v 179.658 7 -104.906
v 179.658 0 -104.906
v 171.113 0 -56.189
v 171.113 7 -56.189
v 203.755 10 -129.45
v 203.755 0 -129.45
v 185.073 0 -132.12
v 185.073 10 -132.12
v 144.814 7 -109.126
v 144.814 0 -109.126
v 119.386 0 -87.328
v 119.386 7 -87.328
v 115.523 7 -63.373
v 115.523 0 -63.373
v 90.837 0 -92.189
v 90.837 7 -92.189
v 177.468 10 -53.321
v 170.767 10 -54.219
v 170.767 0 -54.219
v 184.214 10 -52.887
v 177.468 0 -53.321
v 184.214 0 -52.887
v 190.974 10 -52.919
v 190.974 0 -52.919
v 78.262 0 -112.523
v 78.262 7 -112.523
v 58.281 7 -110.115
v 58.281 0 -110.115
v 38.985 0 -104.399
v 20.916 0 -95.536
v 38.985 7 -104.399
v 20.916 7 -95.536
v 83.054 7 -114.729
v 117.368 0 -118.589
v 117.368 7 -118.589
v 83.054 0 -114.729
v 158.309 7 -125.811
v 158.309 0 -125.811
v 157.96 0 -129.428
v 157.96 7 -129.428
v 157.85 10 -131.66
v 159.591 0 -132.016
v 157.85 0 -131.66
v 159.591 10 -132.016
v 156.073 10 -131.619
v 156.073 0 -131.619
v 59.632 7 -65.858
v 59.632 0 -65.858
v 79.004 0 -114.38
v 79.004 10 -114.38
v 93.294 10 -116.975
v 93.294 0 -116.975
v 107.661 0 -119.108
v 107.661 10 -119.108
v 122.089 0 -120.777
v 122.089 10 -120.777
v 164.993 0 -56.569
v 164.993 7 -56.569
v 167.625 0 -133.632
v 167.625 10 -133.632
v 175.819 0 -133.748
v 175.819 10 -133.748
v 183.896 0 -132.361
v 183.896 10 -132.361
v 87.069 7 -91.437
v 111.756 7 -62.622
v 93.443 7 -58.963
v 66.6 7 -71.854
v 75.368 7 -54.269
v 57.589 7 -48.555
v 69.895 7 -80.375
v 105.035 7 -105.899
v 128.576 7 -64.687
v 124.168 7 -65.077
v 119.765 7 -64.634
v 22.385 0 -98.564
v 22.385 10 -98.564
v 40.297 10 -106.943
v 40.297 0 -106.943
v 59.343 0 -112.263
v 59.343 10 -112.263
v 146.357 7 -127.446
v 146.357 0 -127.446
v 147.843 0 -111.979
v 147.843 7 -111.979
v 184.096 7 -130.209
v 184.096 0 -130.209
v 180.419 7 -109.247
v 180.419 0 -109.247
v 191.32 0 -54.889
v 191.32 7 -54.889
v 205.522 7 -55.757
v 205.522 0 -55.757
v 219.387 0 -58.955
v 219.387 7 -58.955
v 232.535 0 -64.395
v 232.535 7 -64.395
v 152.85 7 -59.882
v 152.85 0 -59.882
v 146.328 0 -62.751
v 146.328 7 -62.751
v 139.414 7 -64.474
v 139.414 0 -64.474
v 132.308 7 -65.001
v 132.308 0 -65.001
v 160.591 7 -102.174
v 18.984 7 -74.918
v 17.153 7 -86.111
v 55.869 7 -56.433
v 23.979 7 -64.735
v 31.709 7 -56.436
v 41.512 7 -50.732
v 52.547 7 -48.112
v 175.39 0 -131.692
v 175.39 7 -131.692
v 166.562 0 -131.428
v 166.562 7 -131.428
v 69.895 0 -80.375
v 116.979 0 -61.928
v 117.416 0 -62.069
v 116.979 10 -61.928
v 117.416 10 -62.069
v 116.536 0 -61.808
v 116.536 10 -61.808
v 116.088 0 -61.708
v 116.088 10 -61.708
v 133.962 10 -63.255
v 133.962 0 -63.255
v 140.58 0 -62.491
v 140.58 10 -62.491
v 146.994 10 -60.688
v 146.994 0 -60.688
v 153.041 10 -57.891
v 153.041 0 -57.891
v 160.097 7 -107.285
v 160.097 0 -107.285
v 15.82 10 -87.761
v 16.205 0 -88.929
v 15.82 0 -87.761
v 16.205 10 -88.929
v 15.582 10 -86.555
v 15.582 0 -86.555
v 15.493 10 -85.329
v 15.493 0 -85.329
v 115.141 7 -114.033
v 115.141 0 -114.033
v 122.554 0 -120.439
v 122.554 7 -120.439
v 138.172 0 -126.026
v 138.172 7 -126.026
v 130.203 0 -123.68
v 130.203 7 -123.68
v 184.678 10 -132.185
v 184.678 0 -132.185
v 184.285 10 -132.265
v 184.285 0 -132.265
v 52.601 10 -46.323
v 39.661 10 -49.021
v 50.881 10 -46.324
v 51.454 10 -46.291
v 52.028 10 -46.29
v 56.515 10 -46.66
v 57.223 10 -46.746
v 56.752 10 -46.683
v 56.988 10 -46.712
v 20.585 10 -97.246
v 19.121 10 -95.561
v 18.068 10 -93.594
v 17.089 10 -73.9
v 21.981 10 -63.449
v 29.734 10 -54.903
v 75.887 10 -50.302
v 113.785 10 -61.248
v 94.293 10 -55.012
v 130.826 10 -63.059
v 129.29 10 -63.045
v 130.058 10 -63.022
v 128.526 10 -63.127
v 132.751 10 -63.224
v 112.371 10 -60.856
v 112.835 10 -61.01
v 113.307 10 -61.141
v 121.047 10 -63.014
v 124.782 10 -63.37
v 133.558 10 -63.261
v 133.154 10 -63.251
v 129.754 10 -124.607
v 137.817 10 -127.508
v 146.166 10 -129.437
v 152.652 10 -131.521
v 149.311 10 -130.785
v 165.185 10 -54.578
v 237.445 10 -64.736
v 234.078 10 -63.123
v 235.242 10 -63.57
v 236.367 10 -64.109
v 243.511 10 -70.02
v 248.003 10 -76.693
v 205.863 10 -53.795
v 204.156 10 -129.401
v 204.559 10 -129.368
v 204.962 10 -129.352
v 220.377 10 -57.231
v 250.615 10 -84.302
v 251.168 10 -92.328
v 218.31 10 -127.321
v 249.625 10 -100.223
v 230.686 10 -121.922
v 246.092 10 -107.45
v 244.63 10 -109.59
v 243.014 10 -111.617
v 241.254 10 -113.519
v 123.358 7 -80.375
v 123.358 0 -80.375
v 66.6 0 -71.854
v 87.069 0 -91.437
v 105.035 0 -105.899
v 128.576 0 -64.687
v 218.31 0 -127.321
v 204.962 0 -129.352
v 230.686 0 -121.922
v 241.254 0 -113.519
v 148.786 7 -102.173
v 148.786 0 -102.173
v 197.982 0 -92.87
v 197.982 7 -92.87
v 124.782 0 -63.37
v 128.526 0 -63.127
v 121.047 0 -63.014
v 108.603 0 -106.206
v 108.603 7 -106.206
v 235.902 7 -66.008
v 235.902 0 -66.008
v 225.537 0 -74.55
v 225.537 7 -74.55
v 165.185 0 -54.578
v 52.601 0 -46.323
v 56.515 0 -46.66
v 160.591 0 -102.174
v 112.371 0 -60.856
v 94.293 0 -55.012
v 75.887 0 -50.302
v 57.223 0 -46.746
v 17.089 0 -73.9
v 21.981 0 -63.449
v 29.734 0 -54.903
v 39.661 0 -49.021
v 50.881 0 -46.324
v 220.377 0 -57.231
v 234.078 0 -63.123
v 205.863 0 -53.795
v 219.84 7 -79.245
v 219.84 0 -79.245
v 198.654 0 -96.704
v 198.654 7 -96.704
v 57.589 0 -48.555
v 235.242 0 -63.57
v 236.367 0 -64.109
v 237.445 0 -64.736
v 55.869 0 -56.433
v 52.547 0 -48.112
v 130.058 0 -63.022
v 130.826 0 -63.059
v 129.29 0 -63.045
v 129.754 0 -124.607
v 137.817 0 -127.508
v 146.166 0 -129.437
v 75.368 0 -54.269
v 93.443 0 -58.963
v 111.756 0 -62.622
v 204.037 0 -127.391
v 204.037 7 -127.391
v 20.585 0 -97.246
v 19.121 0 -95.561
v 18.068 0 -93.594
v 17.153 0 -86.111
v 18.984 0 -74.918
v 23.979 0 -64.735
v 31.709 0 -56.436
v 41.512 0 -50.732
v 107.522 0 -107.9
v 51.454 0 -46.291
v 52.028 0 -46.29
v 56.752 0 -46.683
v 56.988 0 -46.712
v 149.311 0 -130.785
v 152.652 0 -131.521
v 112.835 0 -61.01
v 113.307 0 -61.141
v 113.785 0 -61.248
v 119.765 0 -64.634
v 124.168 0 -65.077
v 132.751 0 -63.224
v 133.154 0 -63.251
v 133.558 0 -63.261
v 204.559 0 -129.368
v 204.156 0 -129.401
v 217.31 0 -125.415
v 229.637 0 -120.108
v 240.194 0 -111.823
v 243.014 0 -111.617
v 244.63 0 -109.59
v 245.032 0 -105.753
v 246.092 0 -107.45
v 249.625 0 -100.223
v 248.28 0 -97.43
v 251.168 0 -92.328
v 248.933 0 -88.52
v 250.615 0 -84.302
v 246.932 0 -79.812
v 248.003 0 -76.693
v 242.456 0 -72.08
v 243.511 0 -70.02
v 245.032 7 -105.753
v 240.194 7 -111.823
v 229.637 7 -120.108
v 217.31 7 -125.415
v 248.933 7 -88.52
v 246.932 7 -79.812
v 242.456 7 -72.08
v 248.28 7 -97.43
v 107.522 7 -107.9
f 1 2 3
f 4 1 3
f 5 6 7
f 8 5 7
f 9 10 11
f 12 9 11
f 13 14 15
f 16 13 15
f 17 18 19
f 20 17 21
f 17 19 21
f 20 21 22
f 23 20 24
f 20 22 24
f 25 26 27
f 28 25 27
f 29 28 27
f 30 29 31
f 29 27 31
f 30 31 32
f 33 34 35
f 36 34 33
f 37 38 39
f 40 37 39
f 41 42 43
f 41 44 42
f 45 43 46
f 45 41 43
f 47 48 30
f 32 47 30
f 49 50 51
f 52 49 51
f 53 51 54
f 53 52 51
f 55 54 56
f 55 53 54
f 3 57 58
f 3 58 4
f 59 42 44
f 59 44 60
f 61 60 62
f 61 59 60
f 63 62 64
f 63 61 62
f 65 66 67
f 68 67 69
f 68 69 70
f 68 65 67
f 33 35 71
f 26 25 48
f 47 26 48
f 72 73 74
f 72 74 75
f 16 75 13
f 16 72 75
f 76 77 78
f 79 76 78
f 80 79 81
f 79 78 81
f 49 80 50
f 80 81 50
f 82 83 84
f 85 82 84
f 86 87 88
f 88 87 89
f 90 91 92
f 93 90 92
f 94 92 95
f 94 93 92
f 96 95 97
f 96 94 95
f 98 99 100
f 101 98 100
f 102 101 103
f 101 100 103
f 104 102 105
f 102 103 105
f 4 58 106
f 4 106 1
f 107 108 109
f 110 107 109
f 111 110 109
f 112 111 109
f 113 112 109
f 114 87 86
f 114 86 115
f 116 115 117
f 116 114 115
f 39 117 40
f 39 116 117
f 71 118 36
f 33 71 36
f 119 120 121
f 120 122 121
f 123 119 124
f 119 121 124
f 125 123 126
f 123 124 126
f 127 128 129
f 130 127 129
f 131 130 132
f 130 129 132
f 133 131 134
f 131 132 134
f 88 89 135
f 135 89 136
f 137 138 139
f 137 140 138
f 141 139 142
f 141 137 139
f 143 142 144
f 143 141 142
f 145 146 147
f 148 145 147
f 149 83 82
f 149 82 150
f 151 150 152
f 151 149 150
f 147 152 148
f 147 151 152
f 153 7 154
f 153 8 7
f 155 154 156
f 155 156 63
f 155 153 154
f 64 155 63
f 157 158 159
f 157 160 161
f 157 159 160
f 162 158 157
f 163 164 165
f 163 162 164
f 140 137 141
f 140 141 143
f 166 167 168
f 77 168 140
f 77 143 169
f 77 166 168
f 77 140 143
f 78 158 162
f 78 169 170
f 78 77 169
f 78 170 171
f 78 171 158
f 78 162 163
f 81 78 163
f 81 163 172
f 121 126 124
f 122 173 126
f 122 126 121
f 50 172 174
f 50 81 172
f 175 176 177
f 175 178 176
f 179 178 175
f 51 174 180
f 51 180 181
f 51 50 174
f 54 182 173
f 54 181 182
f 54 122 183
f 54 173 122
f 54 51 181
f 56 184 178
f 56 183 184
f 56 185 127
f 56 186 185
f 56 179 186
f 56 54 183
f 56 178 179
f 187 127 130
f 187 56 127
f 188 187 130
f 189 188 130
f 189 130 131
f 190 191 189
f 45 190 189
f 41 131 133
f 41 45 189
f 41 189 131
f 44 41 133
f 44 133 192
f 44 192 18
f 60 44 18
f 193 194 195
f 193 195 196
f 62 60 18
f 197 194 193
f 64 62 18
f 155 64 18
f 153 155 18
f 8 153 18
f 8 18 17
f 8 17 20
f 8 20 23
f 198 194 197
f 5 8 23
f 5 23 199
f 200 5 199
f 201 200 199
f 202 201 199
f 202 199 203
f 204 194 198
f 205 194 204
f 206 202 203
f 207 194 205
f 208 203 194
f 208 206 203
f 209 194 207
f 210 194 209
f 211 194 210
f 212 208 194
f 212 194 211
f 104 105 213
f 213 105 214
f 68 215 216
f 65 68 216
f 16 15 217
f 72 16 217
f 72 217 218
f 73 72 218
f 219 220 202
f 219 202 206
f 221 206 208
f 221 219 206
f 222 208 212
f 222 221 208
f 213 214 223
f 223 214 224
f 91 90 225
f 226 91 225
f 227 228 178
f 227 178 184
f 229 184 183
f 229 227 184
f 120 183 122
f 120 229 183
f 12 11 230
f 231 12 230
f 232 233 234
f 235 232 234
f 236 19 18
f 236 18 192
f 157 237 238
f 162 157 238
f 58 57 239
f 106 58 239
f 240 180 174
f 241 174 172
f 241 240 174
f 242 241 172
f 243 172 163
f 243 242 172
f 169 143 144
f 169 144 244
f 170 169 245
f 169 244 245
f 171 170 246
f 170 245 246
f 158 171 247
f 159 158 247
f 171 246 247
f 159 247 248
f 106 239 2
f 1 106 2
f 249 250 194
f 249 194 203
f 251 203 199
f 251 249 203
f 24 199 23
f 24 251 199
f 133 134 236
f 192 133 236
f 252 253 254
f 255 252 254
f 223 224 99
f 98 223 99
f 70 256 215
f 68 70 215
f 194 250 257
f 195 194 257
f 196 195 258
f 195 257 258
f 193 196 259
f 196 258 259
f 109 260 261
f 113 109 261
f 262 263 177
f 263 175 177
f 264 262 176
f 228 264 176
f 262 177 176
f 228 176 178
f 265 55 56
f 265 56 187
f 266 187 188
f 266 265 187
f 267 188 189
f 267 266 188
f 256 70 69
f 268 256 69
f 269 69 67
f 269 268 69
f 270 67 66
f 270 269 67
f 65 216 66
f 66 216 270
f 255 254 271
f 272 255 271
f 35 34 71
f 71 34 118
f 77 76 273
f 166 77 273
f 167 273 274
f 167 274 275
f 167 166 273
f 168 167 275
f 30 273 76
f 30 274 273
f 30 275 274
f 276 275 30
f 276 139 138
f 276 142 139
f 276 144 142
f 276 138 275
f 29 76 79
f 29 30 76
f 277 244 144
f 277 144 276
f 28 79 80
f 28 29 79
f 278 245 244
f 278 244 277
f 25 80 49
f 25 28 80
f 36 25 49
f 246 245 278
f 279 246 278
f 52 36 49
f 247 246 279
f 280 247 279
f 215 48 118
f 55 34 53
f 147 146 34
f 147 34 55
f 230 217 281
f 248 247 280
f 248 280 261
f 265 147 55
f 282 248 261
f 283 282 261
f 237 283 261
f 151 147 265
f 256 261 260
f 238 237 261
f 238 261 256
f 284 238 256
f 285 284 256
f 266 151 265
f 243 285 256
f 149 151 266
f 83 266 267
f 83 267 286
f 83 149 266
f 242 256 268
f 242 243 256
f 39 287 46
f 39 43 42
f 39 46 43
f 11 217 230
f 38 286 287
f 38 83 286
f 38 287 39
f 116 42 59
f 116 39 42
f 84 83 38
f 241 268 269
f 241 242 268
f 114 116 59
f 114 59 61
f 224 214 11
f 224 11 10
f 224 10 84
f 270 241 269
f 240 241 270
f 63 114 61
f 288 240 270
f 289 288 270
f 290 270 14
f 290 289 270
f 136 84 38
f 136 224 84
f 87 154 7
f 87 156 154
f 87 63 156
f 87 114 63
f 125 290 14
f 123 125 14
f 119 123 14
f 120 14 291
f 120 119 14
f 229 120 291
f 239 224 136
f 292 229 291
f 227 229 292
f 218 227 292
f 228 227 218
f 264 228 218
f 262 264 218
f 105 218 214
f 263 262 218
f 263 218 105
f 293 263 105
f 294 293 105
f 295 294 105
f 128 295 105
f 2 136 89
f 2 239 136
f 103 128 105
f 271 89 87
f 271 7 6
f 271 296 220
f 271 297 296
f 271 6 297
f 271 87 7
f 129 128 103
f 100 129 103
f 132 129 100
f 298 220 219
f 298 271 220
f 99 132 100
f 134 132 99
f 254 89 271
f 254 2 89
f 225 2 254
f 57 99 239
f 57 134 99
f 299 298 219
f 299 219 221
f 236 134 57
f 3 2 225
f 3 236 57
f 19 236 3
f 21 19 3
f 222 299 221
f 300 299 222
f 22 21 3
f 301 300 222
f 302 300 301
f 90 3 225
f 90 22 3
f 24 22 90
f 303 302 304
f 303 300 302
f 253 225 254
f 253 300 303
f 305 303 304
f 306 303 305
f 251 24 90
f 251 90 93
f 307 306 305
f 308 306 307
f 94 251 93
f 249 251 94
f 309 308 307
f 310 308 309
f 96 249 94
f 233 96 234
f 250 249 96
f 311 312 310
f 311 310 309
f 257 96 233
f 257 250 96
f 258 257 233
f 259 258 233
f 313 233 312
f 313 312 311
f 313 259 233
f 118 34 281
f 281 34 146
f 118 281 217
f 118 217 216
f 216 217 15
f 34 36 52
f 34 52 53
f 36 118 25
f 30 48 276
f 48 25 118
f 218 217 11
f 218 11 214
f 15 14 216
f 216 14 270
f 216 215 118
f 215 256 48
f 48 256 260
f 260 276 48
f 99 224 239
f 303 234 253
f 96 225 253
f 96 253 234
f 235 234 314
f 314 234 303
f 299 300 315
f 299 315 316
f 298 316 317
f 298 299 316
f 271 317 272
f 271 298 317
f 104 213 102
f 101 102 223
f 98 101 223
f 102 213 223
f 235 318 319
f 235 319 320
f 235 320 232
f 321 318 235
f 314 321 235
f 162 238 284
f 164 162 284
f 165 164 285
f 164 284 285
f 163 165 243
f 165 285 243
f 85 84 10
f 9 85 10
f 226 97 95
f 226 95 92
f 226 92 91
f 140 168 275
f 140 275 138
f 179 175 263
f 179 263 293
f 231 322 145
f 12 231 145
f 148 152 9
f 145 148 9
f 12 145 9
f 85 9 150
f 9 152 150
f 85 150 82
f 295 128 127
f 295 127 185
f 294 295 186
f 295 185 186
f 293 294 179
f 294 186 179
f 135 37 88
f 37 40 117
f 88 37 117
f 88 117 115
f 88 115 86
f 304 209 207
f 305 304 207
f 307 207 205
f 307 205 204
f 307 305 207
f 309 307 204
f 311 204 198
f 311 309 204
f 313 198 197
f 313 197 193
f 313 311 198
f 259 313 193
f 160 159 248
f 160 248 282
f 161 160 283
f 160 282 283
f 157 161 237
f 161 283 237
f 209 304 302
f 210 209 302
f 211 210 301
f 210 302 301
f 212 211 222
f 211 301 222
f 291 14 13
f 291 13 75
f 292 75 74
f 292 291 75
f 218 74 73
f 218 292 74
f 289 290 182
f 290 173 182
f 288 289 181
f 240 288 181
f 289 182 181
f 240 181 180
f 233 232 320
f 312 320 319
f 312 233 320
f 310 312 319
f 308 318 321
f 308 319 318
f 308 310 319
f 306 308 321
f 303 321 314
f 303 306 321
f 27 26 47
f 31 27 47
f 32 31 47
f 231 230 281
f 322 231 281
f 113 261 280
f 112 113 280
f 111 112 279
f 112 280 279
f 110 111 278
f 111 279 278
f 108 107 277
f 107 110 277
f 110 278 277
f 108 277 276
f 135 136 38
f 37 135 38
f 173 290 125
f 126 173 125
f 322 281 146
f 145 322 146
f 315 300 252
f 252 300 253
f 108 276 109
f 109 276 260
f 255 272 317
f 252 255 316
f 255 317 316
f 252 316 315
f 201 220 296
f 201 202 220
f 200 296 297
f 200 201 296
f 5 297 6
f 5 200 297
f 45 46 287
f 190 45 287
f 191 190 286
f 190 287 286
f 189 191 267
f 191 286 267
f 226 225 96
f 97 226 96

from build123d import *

# Parameters (mm, degrees)
BOSS_EXTRUDE1_DEPTH  = 10
BOSS_EXTRUDE2_DEPTH  = 10
FILLET1_R            = 10
BOSS_EXTRUDE3_DEPTH  = 10
FILLET2_R            = 10
FILLET3_R            = 10
BOSS_EXTRUDE4_DEPTH  = 10
BOSS_EXTRUDE5_DEPTH  = 10
BOSS_EXTRUDE6_DEPTH  = 10
BOSS_EXTRUDE7_DEPTH  = 10
BOSS_EXTRUDE8_DEPTH  = 10
BOSS_EXTRUDE9_DEPTH  = 10
BOSS_EXTRUDE10_DEPTH = 10
BOSS_EXTRUDE11_DEPTH = 10
BOSS_EXTRUDE12_DEPTH = 10
BOSS_EXTRUDE13_DEPTH = 10
FILLET4_R            = 10
FILLET5_R            = 10
FILLET6_R            = 10
BOSS_EXTRUDE14_DEPTH = 3
BOSS_EXTRUDE16_START = -3
BOSS_EXTRUDE16_DEPTH = 3
BOSS_EXTRUDE17_START = -3
BOSS_EXTRUDE17_DEPTH = 3
BOSS_EXTRUDE18_DEPTH = 3
BOSS_EXTRUDE19_START = -3
BOSS_EXTRUDE19_DEPTH = 3
BOSS_EXTRUDE20_START = -3
BOSS_EXTRUDE20_DEPTH = 3
BOSS_EXTRUDE21_START = -3
BOSS_EXTRUDE21_DEPTH = 3
BOSS_EXTRUDE22_START = -3
BOSS_EXTRUDE22_DEPTH = 3
BOSS_EXTRUDE23_DEPTH = 3
BOSS_EXTRUDE24_DEPTH = 3
BOSS_EXTRUDE25_START = -3
BOSS_EXTRUDE25_DEPTH = 3
BOSS_EXTRUDE26_START = -3
BOSS_EXTRUDE26_DEPTH = 3
BOSS_EXTRUDE27_START = -3
BOSS_EXTRUDE27_DEPTH = 3


with BuildPart() as part:
    # Sketch1 → Boss-Extrude1 (new body)
    with BuildSketch(Plane(origin=(0, 0, 0), x_dir=(1, 0, 0), z_dir=(0, 1, 0))):
        with BuildLine():
            Line((51.805250568, 46.254728184), (56.867580546, 46.690093705))
            Line((56.867580546, 46.690093705), (66.599539174, 71.853555984))
            Line((66.599539174, 71.853555984), (87.069484898, 91.437016001))
            Line((87.069484898, 91.437016001), (113.057432433, 61.102946487))
            Line((113.057432433, 61.102946487), (116.82467317, 61.854548169))
            Line((116.82467317, 61.854548169), (90.836725634, 92.188617682))
            Line((90.836725634, 92.188617682), (105.035116548, 105.898750841))
            Line((105.035116548, 105.898750841), (129.568132848, 62.950498647))
            Line((129.568132848, 62.950498647), (133.31455682, 63.272694914))
            Line((133.31455682, 63.272694914), (123.357580852, 80.374925591))
            Line((123.357580852, 80.374925591), (148.785651419, 102.172519068))
            Line((148.785651419, 102.172519068), (153.040868267, 57.891104139))
            Line((153.040868267, 57.891104139), (165.185425052, 54.57791328))
            Line((165.185425052, 54.57791328), (160.590576177, 102.174000873))
            Line((160.590576177, 102.174000873), (179.658076638, 104.906387862))
            Line((179.658076638, 104.906387862), (170.767457679, 54.218871994))
            ThreePointArc((170.767457679, 54.218871994), (180.837217506, 53.04614218), (190.97424035, 52.919153825))
            Line((190.97424035, 52.919153825), (197.981646973, 92.870031941))
            Line((197.981646973, 92.870031941), (234.078179475, 63.123049205))
            ThreePointArc((234.078179475, 63.123049205), (235.810126624, 63.828566908), (237.445115175, 64.736426258))
            Line((237.445115175, 64.736426258), (225.536614511, 74.55016567))
            Line((225.536614511, 74.55016567), (246.091874592, 107.449582187))
            ThreePointArc((246.091874592, 107.449582187), (243.840681793, 110.618047464), (241.25389096, 113.519004964))
            Line((241.25389096, 113.519004964), (240.395012362, 112.144339568))
            Line((240.395012362, 112.144339568), (219.839752281, 79.244923051))
            Line((219.839752281, 79.244923051), (198.654111375, 96.703910123))
            Line((198.654111375, 96.703910123), (204.382089549, 129.360464852))
            Line((204.382089549, 129.360464852), (184.447051736, 132.209464557))
            Line((184.447051736, 132.209464557), (180.419423262, 109.247004562))
            Line((180.419423262, 109.247004562), (160.097156473, 107.285125983))
            Line((160.097156473, 107.285125983), (158.308732306, 125.810652197))
            Line((158.308732306, 125.810652197), (157.766479573, 131.427617904))
            ThreePointArc((157.766479573, 131.427617904), (151.800844978, 131.395283067), (146.165668691, 129.437061966))
            Line((146.165668691, 129.437061966), (147.843325617, 111.978721981))
            Line((147.843325617, 111.978721981), (144.813827038, 109.125716877))
            Line((144.813827038, 109.125716877), (119.385756471, 87.3281234))
            Line((119.385756471, 87.3281234), (108.602540339, 106.205552911))
            Line((108.602540339, 106.205552911), (107.52160572, 107.900291772))
            Line((107.52160572, 107.900291772), (115.140722033, 114.033426524))
            Line((115.140722033, 114.033426524), (122.553726759, 120.438529801))
            ThreePointArc((122.553726759, 120.438529801), (122.391169983, 120.703903688), (122.08857731, 120.776606365))
            Line((122.08857731, 120.776606365), (117.367703847, 118.588729188))
            Line((117.367703847, 118.588729188), (69.895175345, 80.374925591))
            Line((69.895175345, 80.374925591), (83.054291448, 114.72858327))
            Line((83.054291448, 114.72858327), (79.00377159, 114.380234447))
            Line((79.00377159, 114.380234447), (59.63165965, 65.85792942))
            Line((59.63165965, 65.85792942), (19.328949542, 96.752897561))
            Line((19.328949542, 96.752897561), (15.566189716, 87.3281234))
            Line((15.566189716, 87.3281234), (55.868899823, 56.433155258))
            Line((55.868899823, 56.433155258), (51.805250568, 46.254728184))
        make_face()
    extrude(amount=BOSS_EXTRUDE1_DEPTH)

    # Sketch3 → Boss-Extrude2 (add)
    with BuildSketch(Plane(origin=(0, 0, 0), x_dir=(-1, 0, 0), z_dir=(0, -1, 0))):
        with BuildLine():
            Line((-184.447051736, 132.209464557), (-184.096250604, 130.209464557))
            ThreePointArc((-184.096250604, 130.209464557), (-170.969249532, 131.779309143), (-157.95955632, 129.427617904))
            Line((-157.95955632, 129.427617904), (-157.766479573, 131.427617904))
            ThreePointArc((-157.766479573, 131.427617904), (-171.046827654, 133.863929723), (-184.447051736, 132.209464557))
        make_face()
    extrude(amount=-BOSS_EXTRUDE2_DEPTH)

    # Fillet1
    fillet1_edges = [part.edges().sort_by_distance(p)[0] for p in [
        (157.766479573, 5, -131.427617904),
    ]]
    fillet(fillet1_edges, radius=FILLET1_R)

    # Sketch4 → Boss-Extrude3 (add)
    with BuildSketch(Plane.XZ):
        with BuildLine():
            Line((241.25389096, -113.519004964), (240.194147983, -111.822849068))
            ThreePointArc((240.194147983, -111.822849068), (223.645469846, -123.160543749), (204.036563274, -127.390538053))
            Line((204.036563274, -127.390538053), (204.382089549, -129.360464852))
            ThreePointArc((204.382089549, -129.360464852), (224.4077507, -125.139982982), (241.25389096, -113.519004964))
        make_face()
    extrude(amount=-BOSS_EXTRUDE3_DEPTH)

    # Fillet2
    fillet2_edges = [part.edges().sort_by_distance(p)[0] for p in [
        (204.382089549, 5, -129.360464852),
    ]]
    fillet(fillet2_edges, radius=FILLET2_R)

    # Fillet3
    fillet3_edges = [part.edges().sort_by_distance(p)[0] for p in [
        (184.447051736, 5, -132.209464557),
    ]]
    fillet(fillet3_edges, radius=FILLET3_R)

    # Sketch5 → Boss-Extrude4 (add)
    with BuildSketch(Plane(origin=(0, 0, 0), x_dir=(-1, 0, 0), z_dir=(0, -1, 0))):
        with BuildLine():
            Line((-146.165668691, 129.437061966), (-146.35697717, 127.446232725))
            ThreePointArc((-146.35697717, 127.446232725), (-134.153534544, 124.9675725), (-122.553726759, 120.438529801))
            ThreePointArc((-122.553726759, 120.438529801), (-122.391169983, 120.703903688), (-122.08857731, 120.776606365))
            ThreePointArc((-122.08857731, 120.776606365), (-133.74228961, 126.176716529), (-146.165668691, 129.437061966))
        make_face()
    extrude(amount=-BOSS_EXTRUDE4_DEPTH)

    # Sketch6 → Boss-Extrude5 (add)
    with BuildSketch(Plane.XZ):
        with BuildLine():
            Line((117.367703847, -118.588729188), (83.054291448, -114.72858327))
            Line((83.054291448, -114.72858327), (79.00377159, -114.380234447))
            ThreePointArc((79.00377159, -114.380234447), (100.4688886, -118.099003928), (122.08857731, -120.776606365))
            Line((122.08857731, -120.776606365), (117.367703847, -118.588729188))
        make_face()
    extrude(amount=-BOSS_EXTRUDE5_DEPTH)

    # Sketch7 → Boss-Extrude6 (add)
    with BuildSketch(Plane(origin=(0, 10, 0), x_dir=(1, 0, 0), z_dir=(0, 1, 0))):
        with BuildLine():
            Line((79.00377159, 114.380234447), (78.262205131, 112.522795568))
            ThreePointArc((78.262205131, 112.522795568), (48.512953701, 107.66287103), (20.916234075, 95.536128144))
            Line((20.916234075, 95.536128144), (19.328949542, 96.752897561))
            ThreePointArc((19.328949542, 96.752897561), (48.002866802, 109.505407349), (79.00377159, 114.380234447))
        make_face()
    extrude(amount=-BOSS_EXTRUDE6_DEPTH)

    # Sketch8 → Boss-Extrude7 (add)
    with BuildSketch(Plane.XZ):
        with BuildLine():
            Line((51.805250568, -46.254728184), (52.546817026, -48.112167063))
            ThreePointArc((52.546817026, -48.112167063), (27.538270706, -60.301307017), (17.153474248, -86.111353983))
            Line((17.153474248, -86.111353983), (15.566189716, -87.3281234))
            ThreePointArc((15.566189716, -87.3281234), (25.179141466, -59.286070545), (51.805250568, -46.254728184))
        make_face()
    extrude(amount=-BOSS_EXTRUDE7_DEPTH)

    # Sketch9 → Boss-Extrude8 (add)
    with BuildSketch(Plane.XZ):
        with BuildLine():
            Line((56.867580546, -46.690093705), (57.589005486, -48.555447841))
            ThreePointArc((57.589005486, -48.555447841), (84.37250162, -56.744283383), (111.756215819, -62.621773443))
            Line((111.756215819, -62.621773443), (113.057432433, -61.102946487))
            ThreePointArc((113.057432433, -61.102946487), (85.305396239, -52.559732402), (56.867580546, -46.690093705))
        make_face()
    extrude(amount=-BOSS_EXTRUDE8_DEPTH)

    # Sketch10 → Boss-Extrude9 (add)
    with BuildSketch(Plane(origin=(0, 0, 0), x_dir=(-1, 0, 0), z_dir=(0, -1, 0))):
        with BuildLine():
            Line((-116.82467317, 61.854548169), (-115.523456556, 63.373375125))
            ThreePointArc((-115.523456556, 63.373375125), (-121.956257585, 64.95953709), (-128.576124511, 64.687138926))
            Line((-128.576124511, 64.687138926), (-129.568132848, 62.950498647))
            ThreePointArc((-129.568132848, 62.950498647), (-123.120409738, 63.286155655), (-116.82467317, 61.854548169))
        make_face()
    extrude(amount=-BOSS_EXTRUDE9_DEPTH)

    # Sketch11 → Boss-Extrude10 (add)
    with BuildSketch(Plane.XZ):
        with BuildLine():
            Line((153.040868267, -57.891104139), (152.849559788, -59.88193338))
            ThreePointArc((152.849559788, -59.88193338), (142.907546747, -63.760188349), (132.308272343, -65.001102144))
            Line((132.308272343, -65.001102144), (133.31455682, -63.272694914))
            ThreePointArc((133.31455682, -63.272694914), (143.510926178, -61.803299707), (153.040868267, -57.891104139))
        make_face()
    extrude(amount=-BOSS_EXTRUDE10_DEPTH)

    # Sketch12 → Boss-Extrude11 (add)
    with BuildSketch(Plane.XZ):
        Polygon((170.767457679, -54.218871994), (165.185425052, -54.57791328), (164.99324177, -56.568658263), (171.112983954, -56.188798793), align=None)
    extrude(amount=-BOSS_EXTRUDE11_DEPTH)

    # Sketch13 → Boss-Extrude12 (add)
    with BuildSketch(Plane.XZ):
        with BuildLine():
            Line((237.445115175, -64.736426258), (235.901683391, -66.008361134))
            ThreePointArc((235.901683391, -66.008361134), (248.258475049, -84.090973284), (245.032131615, -105.753426291))
            Line((245.032131615, -105.753426291), (246.091874592, -107.449582187))
            ThreePointArc((246.091874592, -107.449582187), (250.614679122, -84.302201712), (237.445115175, -64.736426258))
        make_face()
    extrude(amount=-BOSS_EXTRUDE12_DEPTH)

    # Sketch14 → Boss-Extrude13 (add)
    with BuildSketch(Plane.XZ):
        with BuildLine():
            Line((190.97424035, -52.919153825), (191.319766625, -54.889080624))
            ThreePointArc((191.319766625, -54.889080624), (212.52084719, -57.06838935), (232.534747692, -64.394984081))
            Line((232.534747692, -64.394984081), (234.078179475, -63.123049205))
            ThreePointArc((234.078179475, -63.123049205), (213.194515683, -55.198002086), (190.97424035, -52.919153825))
        make_face()
    extrude(amount=-BOSS_EXTRUDE13_DEPTH)

    # Fillet4
    fillet4_edges = [part.edges().sort_by_distance(p)[0] for p in [
        (133.31455682, 5, -63.272694914),
        (129.568132848, 5, -62.950498647),
        (116.82467317, 5, -61.854548169),
        (113.057432433, 5, -61.102946487),
    ]]
    fillet(fillet4_edges, radius=FILLET4_R)

    # Fillet5
    # the kernel refuses this fillet: 10 mm, written as the material it takes off along each edge
    with BuildSketch(Plane(origin=(56.867580546, -0.900144387, -46.690093705), x_dir=(0.9877650784630306, 0, -0.15594918970268098), z_dir=(0, 1, 0))) as fillet5_piece_1:
        with BuildLine():
            CenterArc((0.354164433, 9.999998263), FILLET5_R, 265.943550384, 4.090215864)
            Line((-0.353228281, 0.025049865), (0, 0))
            ThreePointArc((0, 0), (0.180028877, -5.3048e-05), (0.360057755, 0))
        make_face()
    extrude(amount=11.800288773, mode=Mode.SUBTRACT)
    with BuildSketch(Plane(origin=(51.805250568, -2.317018867, -46.254728184), x_dir=(0.9963223007849147, 0, -0.08568473002031346), z_dir=(0, 1, 0))) as fillet5_piece_2:
        with BuildLine():
            CenterArc((0.79824645, 10), FILLET5_R, 260.135505168, 9.864494831)
            ThreePointArc((-0.914939677, 0.147843216), (-0.45791207, 0.071184823), (0, 0))
            Line((0, 0), (0.79824645, 0))
        make_face()
    extrude(amount=14.634037735, mode=Mode.SUBTRACT)

    # Fillet6
    fillet6_edges = [part.edges().sort_by_distance(p)[0] for p in [
        (15.566189716, 5, -87.3281234),
        (19.328949542, 5, -96.752897561),
    ]]
    fillet(fillet6_edges, radius=FILLET6_R)

    # Sketch15 → Boss-Extrude14 (add)
    with BuildSketch(Plane(origin=(0, 10, 0), x_dir=(1, 0, 0), z_dir=(0, 1, 0))):
        with BuildLine():
            Line((78.262205131, 112.522795568), (59.63165965, 65.85792942))
            Line((59.63165965, 65.85792942), (20.916234075, 95.536128144))
            ThreePointArc((20.916234075, 95.536128144), (48.512953701, 107.66287103), (78.262205131, 112.522795568))
        make_face()
    extrude(amount=-BOSS_EXTRUDE14_DEPTH)

    # Sketch16 → Boss-Extrude16 (add)
    with BuildSketch(Plane(origin=(0, 10, 0), x_dir=(1, 0, 0), z_dir=(0, 1, 0)).offset(BOSS_EXTRUDE16_START)):
        with BuildLine():
            Line((52.546817026, 48.112167063), (55.868899823, 56.433155258))
            Line((55.868899823, 56.433155258), (17.153474248, 86.111353983))
            ThreePointArc((17.153474248, 86.111353983), (27.538270706, 60.301307017), (52.546817026, 48.112167063))
        make_face()
    extrude(amount=BOSS_EXTRUDE16_DEPTH)

    # Sketch20 → Boss-Extrude17 (add)
    with BuildSketch(Plane(origin=(0, 10, 0), x_dir=(1, 0, 0), z_dir=(0, 1, 0)).offset(BOSS_EXTRUDE17_START)):
        with BuildLine():
            Line((57.589005486, 48.555447841), (66.599539174, 71.853555984))
            Line((66.599539174, 71.853555984), (87.069484898, 91.437016001))
            Line((87.069484898, 91.437016001), (111.756215819, 62.621773443))
            ThreePointArc((111.756215819, 62.621773443), (84.37250162, 56.744283383), (57.589005486, 48.555447841))
        make_face()
    extrude(amount=BOSS_EXTRUDE17_DEPTH)

    # Sketch21 → Boss-Extrude18 (add)
    with BuildSketch(Plane(origin=(0, 10, 0), x_dir=(1, 0, 0), z_dir=(0, 1, 0))):
        Polygon((69.895175345, 80.374925591), (83.054291448, 114.72858327), (117.367703847, 118.588729188), align=None)
    extrude(amount=-BOSS_EXTRUDE18_DEPTH)

    # Sketch22 → Boss-Extrude19 (add)
    with BuildSketch(Plane(origin=(0, 10, 0), x_dir=(1, 0, 0), z_dir=(0, 1, 0)).offset(BOSS_EXTRUDE19_START)):
        with BuildLine():
            Line((115.523456556, 63.373375125), (90.836725634, 92.188617682))
            Line((90.836725634, 92.188617682), (105.035116548, 105.898750841))
            Line((105.035116548, 105.898750841), (128.576124511, 64.687138926))
            ThreePointArc((128.576124511, 64.687138926), (121.956257585, 64.95953709), (115.523456556, 63.373375125))
        make_face()
    extrude(amount=BOSS_EXTRUDE19_DEPTH)

    # Sketch23 → Boss-Extrude20 (add)
    with BuildSketch(Plane(origin=(0, 10, 0), x_dir=(1, 0, 0), z_dir=(0, 1, 0)).offset(BOSS_EXTRUDE20_START)):
        with BuildLine():
            Line((152.849559788, 59.88193338), (148.785651419, 102.172519068))
            Line((148.785651419, 102.172519068), (123.357580852, 80.374925591))
            Line((123.357580852, 80.374925591), (132.308272343, 65.001102144))
            ThreePointArc((132.308272343, 65.001102144), (142.907546747, 63.760188349), (152.849559788, 59.88193338))
        make_face()
    extrude(amount=BOSS_EXTRUDE20_DEPTH)

    # Sketch24 → Boss-Extrude21 (add)
    with BuildSketch(Plane(origin=(0, 10, 0), x_dir=(1, 0, 0), z_dir=(0, 1, 0)).offset(BOSS_EXTRUDE21_START)):
        with BuildLine():
            Line((107.52160572, 107.900291772), (108.602540339, 106.205552911))
            Line((108.602540339, 106.205552911), (119.385756471, 87.3281234))
            Line((119.385756471, 87.3281234), (147.843325617, 111.978721981))
            Line((147.843325617, 111.978721981), (146.35697717, 127.446232725))
            ThreePointArc((146.35697717, 127.446232725), (134.153534544, 124.9675725), (122.553726759, 120.438529801))
            Line((122.553726759, 120.438529801), (115.140722033, 114.033426524))
            Line((115.140722033, 114.033426524), (107.52160572, 107.900291772))
        make_face()
    extrude(amount=BOSS_EXTRUDE21_DEPTH)

    # Sketch25 → Boss-Extrude22 (add)
    with BuildSketch(Plane(origin=(0, 10, 0), x_dir=(1, 0, 0), z_dir=(0, 1, 0)).offset(BOSS_EXTRUDE22_START)):
        with BuildLine():
            Line((157.95955632, 129.427617904), (160.097156473, 107.285125983))
            Line((160.097156473, 107.285125983), (180.419423262, 109.247004562))
            Line((180.419423262, 109.247004562), (184.096250604, 130.209464557))
            ThreePointArc((184.096250604, 130.209464557), (170.969249532, 131.779309143), (157.95955632, 129.427617904))
        make_face()
    extrude(amount=BOSS_EXTRUDE22_DEPTH)

    # Sketch26 → Boss-Extrude23 (add)
    with BuildSketch(Plane(origin=(0, 10, 0), x_dir=(1, 0, 0), z_dir=(0, 1, 0))):
        Polygon((160.590576177, 102.174000873), (164.99324177, 56.568658263), (171.112983954, 56.188798793), (179.658076638, 104.906387862), align=None)
    extrude(amount=-BOSS_EXTRUDE23_DEPTH)

    # Sketch27 → Boss-Extrude24 (add)
    with BuildSketch(Plane(origin=(0, 10, 0), x_dir=(1, 0, 0), z_dir=(0, 1, 0))):
        Polygon((119.385756471, 87.3281234), (144.813827038, 109.125716877), (147.843325617, 111.978721981), align=None)
    extrude(amount=-BOSS_EXTRUDE24_DEPTH)

    # Sketch28 → Boss-Extrude25 (add)
    with BuildSketch(Plane(origin=(0, 10, 0), x_dir=(1, 0, 0), z_dir=(0, 1, 0)).offset(BOSS_EXTRUDE25_START)):
        with BuildLine():
            Line((235.901683391, 66.008361134), (225.536614511, 74.55016567))
            Line((225.536614511, 74.55016567), (245.032131615, 105.753426291))
            ThreePointArc((245.032131615, 105.753426291), (248.258475049, 84.090973284), (235.901683391, 66.008361134))
        make_face()
    extrude(amount=BOSS_EXTRUDE25_DEPTH)

    # Sketch29 → Boss-Extrude26 (add)
    with BuildSketch(Plane(origin=(0, 10, 0), x_dir=(1, 0, 0), z_dir=(0, 1, 0)).offset(BOSS_EXTRUDE26_START)):
        with BuildLine():
            Line((191.319766625, 54.889080624), (197.981646973, 92.870031941))
            Line((197.981646973, 92.870031941), (232.534747692, 64.394984081))
            ThreePointArc((232.534747692, 64.394984081), (212.52084719, 57.06838935), (191.319766625, 54.889080624))
        make_face()
    extrude(amount=BOSS_EXTRUDE26_DEPTH)

    # Sketch30 → Boss-Extrude27 (add)
    with BuildSketch(Plane(origin=(0, 10, 0), x_dir=(1, 0, 0), z_dir=(0, 1, 0)).offset(BOSS_EXTRUDE27_START)):
        with BuildLine():
            Line((204.036563274, 127.390538053), (198.654111375, 96.703910123))
            Line((198.654111375, 96.703910123), (219.839752281, 79.244923051))
            Line((219.839752281, 79.244923051), (240.194147983, 111.822849068))
            ThreePointArc((240.194147983, 111.822849068), (223.645469846, 123.160543749), (204.036563274, 127.390538053))
        make_face()
    extrude(amount=BOSS_EXTRUDE27_DEPTH)


solid = part.part
